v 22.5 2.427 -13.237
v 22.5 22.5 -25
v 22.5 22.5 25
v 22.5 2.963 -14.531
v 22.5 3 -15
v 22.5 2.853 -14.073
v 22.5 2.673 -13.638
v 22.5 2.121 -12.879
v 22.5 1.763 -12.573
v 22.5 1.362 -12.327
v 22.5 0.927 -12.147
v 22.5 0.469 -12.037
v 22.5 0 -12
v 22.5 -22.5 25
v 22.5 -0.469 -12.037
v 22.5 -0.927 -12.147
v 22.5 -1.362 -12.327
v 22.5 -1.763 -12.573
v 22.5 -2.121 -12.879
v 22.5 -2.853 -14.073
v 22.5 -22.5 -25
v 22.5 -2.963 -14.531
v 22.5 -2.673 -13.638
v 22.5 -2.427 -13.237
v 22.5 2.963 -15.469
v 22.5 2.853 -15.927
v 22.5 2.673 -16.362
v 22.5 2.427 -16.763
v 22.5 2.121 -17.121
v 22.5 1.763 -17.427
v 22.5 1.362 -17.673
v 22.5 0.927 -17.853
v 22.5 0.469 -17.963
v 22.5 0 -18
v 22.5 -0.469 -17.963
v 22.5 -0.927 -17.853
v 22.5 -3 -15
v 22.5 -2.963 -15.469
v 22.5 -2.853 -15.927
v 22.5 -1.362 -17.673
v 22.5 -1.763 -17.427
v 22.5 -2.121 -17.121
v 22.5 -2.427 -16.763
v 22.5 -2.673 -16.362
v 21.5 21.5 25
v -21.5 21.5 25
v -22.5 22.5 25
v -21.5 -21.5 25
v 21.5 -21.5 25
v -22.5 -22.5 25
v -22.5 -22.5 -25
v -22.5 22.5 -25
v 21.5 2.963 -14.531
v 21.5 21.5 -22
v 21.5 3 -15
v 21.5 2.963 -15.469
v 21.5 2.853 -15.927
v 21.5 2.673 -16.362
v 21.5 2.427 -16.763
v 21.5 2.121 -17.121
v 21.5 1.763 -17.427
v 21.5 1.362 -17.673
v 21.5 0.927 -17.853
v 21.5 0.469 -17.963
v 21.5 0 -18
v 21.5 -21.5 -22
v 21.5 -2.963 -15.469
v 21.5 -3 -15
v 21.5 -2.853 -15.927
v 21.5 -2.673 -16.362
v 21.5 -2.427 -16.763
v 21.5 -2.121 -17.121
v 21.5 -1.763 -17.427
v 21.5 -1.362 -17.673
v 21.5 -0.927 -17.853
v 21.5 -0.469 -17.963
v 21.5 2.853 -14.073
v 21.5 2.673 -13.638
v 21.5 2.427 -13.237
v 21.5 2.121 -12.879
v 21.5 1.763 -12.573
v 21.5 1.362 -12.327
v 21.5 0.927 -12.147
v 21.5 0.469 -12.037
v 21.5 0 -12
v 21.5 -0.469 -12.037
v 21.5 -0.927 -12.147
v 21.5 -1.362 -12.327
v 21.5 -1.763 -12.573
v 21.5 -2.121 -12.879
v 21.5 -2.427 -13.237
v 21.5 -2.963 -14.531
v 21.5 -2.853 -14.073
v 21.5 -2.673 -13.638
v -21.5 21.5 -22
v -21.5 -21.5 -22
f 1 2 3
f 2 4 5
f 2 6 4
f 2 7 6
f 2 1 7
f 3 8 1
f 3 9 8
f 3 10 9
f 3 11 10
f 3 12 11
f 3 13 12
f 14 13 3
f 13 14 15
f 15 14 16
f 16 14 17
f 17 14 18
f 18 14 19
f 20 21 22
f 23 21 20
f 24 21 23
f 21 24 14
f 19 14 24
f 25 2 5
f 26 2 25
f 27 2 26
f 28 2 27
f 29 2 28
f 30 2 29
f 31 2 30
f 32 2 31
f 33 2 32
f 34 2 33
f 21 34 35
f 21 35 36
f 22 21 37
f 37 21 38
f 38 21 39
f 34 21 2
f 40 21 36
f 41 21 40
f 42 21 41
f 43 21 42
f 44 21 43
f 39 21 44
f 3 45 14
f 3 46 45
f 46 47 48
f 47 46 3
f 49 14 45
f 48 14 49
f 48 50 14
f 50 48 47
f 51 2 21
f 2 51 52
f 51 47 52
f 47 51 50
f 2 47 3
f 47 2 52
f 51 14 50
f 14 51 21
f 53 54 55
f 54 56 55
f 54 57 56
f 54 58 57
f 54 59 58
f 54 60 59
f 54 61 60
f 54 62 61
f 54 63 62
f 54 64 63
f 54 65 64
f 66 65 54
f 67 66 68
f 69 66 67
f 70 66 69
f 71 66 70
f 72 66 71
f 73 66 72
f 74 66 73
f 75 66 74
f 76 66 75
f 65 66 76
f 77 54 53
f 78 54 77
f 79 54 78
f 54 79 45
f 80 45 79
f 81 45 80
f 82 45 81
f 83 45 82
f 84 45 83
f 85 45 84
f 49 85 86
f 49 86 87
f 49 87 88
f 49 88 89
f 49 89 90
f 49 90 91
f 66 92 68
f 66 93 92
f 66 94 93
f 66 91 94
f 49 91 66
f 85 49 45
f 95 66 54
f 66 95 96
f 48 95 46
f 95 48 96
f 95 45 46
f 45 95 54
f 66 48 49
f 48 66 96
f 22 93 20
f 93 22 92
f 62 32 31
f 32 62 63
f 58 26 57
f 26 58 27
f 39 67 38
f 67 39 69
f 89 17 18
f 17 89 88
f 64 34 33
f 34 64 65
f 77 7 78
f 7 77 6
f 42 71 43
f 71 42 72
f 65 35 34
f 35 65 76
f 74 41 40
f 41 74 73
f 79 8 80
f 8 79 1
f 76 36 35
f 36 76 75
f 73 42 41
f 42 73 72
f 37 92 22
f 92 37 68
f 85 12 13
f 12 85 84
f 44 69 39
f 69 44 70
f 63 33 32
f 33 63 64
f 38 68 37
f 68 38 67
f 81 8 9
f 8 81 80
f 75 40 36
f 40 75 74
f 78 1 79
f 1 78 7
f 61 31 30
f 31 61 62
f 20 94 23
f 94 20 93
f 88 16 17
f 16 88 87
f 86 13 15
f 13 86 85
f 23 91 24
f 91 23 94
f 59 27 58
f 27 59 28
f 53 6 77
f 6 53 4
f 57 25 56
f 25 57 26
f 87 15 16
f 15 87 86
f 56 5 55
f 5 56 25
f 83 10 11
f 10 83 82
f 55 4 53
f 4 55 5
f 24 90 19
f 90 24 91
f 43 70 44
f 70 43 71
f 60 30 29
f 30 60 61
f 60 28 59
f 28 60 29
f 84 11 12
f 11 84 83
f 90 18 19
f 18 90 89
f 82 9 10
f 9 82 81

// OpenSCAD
// Notaus
a= 45;
b= 45;
c= 50;

w = 2;

module Outer() {
    
    cube([a,b,c],center=true);
}



module Inner() {
    
    cube([a-w,b-w,c-w],center=true);
}


module box() {
    difference(){
        Outer();
        translate([0,0,w])
        Inner();
        
        rotate([0,90,0])
        translate([15,0,20])
        cylinder(d=6, h=10, center=true, $fn=40);
    }
}

module Deckel() {
    difference() {
        scale([1.2,1.2,1.0])
        Outer();
        translate([0,0,-w])
        scale([1.1,1.1,1.0])
        Outer();
        
        translate([0,0,-5])
        scale([2,2,1.0])
        Outer();
        
        
        translate([0,0,10])
        cylinder(d=23, h=40, center=true, $fn=40);
    }
}

box();
//translate([0,0,10])
//Deckel();
